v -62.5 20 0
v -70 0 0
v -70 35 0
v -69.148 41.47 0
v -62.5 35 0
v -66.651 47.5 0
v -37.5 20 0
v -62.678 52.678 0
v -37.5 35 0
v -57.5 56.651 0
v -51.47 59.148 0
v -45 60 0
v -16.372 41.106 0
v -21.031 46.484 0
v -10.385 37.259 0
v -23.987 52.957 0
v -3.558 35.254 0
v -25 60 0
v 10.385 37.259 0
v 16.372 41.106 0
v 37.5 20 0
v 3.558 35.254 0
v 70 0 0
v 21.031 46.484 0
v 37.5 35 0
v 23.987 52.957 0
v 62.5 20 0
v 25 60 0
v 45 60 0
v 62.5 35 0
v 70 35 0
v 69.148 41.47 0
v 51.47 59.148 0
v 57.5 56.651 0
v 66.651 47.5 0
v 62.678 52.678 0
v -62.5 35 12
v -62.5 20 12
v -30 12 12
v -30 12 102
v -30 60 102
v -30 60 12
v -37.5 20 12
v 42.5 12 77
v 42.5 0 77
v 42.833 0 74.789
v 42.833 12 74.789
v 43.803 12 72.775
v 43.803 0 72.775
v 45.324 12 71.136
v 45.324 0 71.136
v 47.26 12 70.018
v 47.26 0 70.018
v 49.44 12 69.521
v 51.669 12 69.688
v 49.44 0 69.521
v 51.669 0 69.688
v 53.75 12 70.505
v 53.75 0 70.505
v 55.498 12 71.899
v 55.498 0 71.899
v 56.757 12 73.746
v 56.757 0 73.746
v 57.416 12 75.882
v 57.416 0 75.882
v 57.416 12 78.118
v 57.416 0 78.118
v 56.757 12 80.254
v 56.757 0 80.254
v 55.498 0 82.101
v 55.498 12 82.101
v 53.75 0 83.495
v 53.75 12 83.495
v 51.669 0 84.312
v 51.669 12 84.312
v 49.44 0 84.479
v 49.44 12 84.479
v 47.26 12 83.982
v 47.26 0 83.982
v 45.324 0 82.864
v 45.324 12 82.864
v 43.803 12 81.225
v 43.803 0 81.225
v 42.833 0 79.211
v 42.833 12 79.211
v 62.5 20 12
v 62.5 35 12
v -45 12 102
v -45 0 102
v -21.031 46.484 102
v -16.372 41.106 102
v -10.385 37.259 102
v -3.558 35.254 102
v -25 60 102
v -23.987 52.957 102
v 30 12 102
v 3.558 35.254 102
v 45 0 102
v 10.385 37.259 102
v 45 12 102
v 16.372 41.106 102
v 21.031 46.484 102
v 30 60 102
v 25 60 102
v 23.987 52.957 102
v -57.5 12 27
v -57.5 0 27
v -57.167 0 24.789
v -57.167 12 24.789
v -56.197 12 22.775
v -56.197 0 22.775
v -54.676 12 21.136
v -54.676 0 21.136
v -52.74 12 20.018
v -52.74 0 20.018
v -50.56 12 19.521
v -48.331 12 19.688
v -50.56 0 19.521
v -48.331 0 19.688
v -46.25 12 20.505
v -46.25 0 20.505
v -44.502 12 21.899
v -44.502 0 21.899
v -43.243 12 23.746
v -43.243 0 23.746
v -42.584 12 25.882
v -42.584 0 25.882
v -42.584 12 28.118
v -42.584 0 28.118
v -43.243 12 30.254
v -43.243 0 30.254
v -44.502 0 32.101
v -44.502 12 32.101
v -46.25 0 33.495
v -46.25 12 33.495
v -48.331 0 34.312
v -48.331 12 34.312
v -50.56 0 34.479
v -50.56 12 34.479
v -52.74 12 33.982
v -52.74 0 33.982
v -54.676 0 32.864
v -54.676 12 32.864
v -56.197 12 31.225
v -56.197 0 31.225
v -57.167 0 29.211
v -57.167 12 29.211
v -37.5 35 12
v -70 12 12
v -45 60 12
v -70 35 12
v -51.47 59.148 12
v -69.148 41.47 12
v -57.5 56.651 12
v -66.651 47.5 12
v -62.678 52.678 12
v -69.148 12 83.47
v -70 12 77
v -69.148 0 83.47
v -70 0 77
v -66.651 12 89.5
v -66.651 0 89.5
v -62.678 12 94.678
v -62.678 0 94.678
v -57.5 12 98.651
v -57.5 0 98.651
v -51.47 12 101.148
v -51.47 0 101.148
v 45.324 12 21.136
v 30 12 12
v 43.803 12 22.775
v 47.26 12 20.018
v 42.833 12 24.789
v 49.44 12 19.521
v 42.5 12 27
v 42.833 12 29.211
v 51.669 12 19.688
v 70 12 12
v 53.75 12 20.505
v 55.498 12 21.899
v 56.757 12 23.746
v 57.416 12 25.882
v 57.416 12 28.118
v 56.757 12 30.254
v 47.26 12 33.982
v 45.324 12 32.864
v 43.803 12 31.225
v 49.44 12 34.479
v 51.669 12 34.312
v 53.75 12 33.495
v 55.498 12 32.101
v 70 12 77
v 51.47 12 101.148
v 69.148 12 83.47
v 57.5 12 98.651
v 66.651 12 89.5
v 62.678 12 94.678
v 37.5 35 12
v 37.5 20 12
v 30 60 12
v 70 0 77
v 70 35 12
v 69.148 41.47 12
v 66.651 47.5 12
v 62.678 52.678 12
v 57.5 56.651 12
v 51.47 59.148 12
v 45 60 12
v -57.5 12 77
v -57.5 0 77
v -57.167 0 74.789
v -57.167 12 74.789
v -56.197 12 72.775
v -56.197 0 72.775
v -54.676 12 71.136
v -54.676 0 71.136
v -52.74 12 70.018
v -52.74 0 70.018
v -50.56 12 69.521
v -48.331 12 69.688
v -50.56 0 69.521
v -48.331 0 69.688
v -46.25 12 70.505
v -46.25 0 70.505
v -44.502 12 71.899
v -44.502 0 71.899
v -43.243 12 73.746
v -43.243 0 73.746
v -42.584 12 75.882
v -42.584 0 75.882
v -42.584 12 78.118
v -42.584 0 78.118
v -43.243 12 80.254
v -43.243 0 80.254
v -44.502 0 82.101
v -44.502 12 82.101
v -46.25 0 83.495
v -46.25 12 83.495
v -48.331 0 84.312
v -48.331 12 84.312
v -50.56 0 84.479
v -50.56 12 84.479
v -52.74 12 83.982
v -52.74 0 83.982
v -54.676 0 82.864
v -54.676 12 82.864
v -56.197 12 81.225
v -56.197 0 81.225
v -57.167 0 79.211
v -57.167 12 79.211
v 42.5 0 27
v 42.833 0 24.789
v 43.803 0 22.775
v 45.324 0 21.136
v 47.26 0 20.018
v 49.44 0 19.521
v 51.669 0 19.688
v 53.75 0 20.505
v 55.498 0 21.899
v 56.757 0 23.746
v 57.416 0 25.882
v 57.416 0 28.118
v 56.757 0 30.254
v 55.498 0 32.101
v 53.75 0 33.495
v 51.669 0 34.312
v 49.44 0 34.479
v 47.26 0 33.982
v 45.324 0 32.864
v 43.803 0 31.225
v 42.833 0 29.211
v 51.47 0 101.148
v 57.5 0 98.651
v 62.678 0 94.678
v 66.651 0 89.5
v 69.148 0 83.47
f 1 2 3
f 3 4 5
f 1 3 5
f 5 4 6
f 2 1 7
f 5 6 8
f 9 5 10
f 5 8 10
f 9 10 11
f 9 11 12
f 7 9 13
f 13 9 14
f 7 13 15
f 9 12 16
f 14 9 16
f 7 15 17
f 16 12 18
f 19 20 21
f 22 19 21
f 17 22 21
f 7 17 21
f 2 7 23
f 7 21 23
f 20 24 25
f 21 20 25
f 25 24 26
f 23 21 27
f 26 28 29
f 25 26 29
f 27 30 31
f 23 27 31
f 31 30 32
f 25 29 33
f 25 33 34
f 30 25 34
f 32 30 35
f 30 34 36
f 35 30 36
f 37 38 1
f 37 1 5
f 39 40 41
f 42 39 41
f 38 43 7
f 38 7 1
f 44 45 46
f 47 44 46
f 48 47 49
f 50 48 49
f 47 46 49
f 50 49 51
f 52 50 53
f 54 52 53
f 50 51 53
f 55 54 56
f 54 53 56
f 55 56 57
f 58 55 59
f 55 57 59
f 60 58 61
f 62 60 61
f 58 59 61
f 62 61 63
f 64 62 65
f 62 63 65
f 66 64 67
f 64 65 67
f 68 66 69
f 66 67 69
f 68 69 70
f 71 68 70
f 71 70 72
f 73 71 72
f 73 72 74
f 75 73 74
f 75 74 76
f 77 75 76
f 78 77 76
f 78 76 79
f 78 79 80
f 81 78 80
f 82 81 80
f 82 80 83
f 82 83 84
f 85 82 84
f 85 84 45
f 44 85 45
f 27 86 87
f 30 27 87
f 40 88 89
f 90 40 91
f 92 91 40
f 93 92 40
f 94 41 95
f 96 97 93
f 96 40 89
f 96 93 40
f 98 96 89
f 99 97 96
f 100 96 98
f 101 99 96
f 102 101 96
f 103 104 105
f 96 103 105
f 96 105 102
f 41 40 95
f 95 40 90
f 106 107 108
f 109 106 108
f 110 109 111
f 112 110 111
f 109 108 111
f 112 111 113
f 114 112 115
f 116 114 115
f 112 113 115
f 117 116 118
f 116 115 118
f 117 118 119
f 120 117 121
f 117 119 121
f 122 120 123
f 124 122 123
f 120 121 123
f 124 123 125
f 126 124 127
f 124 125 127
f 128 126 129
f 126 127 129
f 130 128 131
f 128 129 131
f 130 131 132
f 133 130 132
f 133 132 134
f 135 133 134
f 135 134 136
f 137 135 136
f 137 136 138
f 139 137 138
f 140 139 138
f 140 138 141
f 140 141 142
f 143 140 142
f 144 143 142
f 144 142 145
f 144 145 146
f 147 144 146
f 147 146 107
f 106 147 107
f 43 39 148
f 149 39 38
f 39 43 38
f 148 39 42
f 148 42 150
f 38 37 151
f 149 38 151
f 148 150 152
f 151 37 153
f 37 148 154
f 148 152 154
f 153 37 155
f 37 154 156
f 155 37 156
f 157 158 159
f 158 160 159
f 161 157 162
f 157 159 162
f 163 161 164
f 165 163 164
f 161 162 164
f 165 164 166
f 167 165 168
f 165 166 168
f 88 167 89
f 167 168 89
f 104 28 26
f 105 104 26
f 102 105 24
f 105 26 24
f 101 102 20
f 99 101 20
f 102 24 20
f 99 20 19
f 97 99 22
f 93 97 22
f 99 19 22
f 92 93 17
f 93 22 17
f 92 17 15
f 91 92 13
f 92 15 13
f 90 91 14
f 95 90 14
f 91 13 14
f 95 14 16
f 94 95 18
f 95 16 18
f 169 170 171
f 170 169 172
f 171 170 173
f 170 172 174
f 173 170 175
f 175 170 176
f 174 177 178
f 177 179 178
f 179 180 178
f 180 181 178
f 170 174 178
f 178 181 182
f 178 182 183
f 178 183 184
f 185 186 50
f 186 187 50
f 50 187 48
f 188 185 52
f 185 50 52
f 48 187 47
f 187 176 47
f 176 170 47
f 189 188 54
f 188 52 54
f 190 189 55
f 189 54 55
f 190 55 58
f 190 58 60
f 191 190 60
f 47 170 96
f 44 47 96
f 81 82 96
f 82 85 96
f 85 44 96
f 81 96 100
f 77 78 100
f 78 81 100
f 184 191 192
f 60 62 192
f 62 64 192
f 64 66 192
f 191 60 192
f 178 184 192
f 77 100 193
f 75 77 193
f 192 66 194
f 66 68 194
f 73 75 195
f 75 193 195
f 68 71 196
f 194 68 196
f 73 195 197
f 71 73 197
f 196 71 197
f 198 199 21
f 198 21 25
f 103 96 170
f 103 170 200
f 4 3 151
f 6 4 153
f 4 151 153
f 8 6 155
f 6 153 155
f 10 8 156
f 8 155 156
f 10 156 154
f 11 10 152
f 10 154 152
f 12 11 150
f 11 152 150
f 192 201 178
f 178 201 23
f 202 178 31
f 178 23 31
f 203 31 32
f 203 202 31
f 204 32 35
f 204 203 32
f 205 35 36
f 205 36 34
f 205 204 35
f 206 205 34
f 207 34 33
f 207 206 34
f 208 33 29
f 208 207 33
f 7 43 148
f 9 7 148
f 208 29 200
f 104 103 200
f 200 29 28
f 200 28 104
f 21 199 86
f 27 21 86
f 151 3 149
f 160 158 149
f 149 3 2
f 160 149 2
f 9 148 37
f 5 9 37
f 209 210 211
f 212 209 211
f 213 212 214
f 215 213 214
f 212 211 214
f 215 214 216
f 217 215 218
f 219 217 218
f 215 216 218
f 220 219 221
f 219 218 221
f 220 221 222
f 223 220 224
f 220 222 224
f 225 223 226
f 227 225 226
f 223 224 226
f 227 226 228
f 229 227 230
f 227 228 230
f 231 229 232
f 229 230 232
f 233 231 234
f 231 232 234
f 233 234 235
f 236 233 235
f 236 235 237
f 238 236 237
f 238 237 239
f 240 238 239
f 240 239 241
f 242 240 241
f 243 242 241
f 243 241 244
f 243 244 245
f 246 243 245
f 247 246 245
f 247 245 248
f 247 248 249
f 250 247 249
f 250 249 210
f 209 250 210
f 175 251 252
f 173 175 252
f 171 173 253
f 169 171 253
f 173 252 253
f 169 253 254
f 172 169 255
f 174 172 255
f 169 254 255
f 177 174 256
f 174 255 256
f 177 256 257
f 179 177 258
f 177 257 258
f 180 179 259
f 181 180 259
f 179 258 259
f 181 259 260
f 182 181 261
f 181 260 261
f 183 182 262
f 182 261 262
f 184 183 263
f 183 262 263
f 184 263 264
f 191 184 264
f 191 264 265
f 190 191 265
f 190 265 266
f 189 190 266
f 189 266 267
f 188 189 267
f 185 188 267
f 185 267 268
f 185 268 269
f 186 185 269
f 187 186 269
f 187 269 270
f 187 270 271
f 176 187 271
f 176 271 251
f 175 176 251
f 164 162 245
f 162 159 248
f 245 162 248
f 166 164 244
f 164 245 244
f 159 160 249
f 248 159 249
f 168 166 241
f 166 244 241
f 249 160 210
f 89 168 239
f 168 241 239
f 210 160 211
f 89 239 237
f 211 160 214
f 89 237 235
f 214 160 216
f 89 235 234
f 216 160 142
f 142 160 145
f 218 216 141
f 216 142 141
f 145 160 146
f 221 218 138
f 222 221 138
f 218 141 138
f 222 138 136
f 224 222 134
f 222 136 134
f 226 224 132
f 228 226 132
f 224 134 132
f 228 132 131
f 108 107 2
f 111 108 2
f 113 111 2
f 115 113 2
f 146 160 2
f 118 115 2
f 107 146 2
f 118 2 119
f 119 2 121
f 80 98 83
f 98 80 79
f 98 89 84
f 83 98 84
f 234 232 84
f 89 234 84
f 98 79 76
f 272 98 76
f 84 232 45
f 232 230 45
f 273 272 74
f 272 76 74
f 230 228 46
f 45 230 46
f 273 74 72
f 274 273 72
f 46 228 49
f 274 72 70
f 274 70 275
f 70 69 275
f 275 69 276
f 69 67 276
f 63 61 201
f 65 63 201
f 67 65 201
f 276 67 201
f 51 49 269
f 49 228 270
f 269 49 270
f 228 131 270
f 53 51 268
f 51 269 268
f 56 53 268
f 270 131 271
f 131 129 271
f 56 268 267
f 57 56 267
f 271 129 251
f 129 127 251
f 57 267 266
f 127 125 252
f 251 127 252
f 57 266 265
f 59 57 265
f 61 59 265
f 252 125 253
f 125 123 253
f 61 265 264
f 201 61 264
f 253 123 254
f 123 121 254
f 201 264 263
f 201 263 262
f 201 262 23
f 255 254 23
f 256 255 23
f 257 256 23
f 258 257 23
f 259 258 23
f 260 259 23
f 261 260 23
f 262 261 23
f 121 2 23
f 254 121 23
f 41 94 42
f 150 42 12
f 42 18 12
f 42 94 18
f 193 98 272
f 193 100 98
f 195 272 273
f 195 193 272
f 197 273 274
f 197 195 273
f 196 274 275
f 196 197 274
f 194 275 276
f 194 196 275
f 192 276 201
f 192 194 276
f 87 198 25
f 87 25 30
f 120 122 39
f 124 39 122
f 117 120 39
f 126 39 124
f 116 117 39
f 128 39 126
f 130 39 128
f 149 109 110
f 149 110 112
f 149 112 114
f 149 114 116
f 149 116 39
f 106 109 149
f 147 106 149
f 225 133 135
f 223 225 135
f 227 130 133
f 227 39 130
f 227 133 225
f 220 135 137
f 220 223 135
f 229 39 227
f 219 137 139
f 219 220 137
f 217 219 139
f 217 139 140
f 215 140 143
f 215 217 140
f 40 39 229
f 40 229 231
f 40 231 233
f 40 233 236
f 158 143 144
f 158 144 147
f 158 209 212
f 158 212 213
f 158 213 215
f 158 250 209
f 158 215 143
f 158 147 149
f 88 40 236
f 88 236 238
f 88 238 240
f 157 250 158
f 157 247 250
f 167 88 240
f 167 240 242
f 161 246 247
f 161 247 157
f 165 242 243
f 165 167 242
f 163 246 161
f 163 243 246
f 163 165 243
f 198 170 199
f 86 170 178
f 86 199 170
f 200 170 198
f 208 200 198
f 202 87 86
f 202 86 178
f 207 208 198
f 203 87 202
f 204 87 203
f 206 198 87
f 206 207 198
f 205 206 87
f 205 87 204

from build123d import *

# Parameters (mm, degrees)
BOSS_EXTRUDE1_DEPTH = 102
SKETCH2_W           = 40
SKETCH2_H           = 48
CUT_EXTRUDE1_DEPTH  = 90
FILLET1_R           = 25
FILLET2_R           = 25
SKETCH3_W           = 25
SKETCH3_H           = 15
CUT_EXTRUDE2_DEPTH  = 90
HOLE1_D             = 15


with BuildPart() as part:
    # Sketch1 → Boss-Extrude1 (new body)
    with BuildSketch(Plane.XY):
        with BuildLine():
            Line((-70, 0), (70, 0))
            Line((70, 0), (70, 60))
            Line((70, 60), (25, 60))
            ThreePointArc((25, 60), (0, 35), (-25, 60))
            Line((-25, 60), (-70, 60))
            Line((-70, 60), (-70, 0))
        make_face()
    extrude(amount=BOSS_EXTRUDE1_DEPTH)

    # Sketch2 → Cut-Extrude1 (cut)
    with BuildSketch(Plane.XY.offset(102)):
        with Locations((50, 36)):
            Rectangle(SKETCH2_W, SKETCH2_H)
    cut_extrude1 = extrude(amount=-CUT_EXTRUDE1_DEPTH, mode=Mode.SUBTRACT)

    # Mirror1: Cut-Extrude1 across plane
    add(cut_extrude1.mirror(Plane(origin=(0, 0, 0), x_dir=(0, 0, 1), z_dir=(1, 0, 0))), mode=Mode.SUBTRACT)

    # Fillet1
    fillet1_edges = [part.edges().sort_by_distance(p)[0] for p in [
        (70, 60, 6),
        (-70, 60, 6),
    ]]
    fillet(fillet1_edges, radius=FILLET1_R)

    # Fillet2
    fillet2_edges = [part.edges().sort_by_distance(p)[0] for p in [
        (70, 6, 102),
        (-70, 6, 102),
    ]]
    fillet(fillet2_edges, radius=FILLET2_R)

    # Sketch3 → Cut-Extrude2 (cut)
    with BuildSketch(Plane.XY.offset(12)):
        with Locations((50, 27.5)):
            Rectangle(SKETCH3_W, SKETCH3_H)
    cut_extrude2 = extrude(amount=-CUT_EXTRUDE2_DEPTH, mode=Mode.SUBTRACT)

    # Mirror2: Cut-Extrude2 across plane
    add(cut_extrude2.mirror(Plane(origin=(0, 0, 0), x_dir=(0, 0, 1), z_dir=(1, 0, 0))), mode=Mode.SUBTRACT)

    # Hole1 (through all)
    with Locations(Plane(origin=(0, 12, 0), x_dir=(1, 0, 0), z_dir=(0, 1, 0))):
        with Locations((50, -77), (50, -27), (-50, -27), (-50, -77)):
            Hole(HOLE1_D / 2)


solid = part.part
